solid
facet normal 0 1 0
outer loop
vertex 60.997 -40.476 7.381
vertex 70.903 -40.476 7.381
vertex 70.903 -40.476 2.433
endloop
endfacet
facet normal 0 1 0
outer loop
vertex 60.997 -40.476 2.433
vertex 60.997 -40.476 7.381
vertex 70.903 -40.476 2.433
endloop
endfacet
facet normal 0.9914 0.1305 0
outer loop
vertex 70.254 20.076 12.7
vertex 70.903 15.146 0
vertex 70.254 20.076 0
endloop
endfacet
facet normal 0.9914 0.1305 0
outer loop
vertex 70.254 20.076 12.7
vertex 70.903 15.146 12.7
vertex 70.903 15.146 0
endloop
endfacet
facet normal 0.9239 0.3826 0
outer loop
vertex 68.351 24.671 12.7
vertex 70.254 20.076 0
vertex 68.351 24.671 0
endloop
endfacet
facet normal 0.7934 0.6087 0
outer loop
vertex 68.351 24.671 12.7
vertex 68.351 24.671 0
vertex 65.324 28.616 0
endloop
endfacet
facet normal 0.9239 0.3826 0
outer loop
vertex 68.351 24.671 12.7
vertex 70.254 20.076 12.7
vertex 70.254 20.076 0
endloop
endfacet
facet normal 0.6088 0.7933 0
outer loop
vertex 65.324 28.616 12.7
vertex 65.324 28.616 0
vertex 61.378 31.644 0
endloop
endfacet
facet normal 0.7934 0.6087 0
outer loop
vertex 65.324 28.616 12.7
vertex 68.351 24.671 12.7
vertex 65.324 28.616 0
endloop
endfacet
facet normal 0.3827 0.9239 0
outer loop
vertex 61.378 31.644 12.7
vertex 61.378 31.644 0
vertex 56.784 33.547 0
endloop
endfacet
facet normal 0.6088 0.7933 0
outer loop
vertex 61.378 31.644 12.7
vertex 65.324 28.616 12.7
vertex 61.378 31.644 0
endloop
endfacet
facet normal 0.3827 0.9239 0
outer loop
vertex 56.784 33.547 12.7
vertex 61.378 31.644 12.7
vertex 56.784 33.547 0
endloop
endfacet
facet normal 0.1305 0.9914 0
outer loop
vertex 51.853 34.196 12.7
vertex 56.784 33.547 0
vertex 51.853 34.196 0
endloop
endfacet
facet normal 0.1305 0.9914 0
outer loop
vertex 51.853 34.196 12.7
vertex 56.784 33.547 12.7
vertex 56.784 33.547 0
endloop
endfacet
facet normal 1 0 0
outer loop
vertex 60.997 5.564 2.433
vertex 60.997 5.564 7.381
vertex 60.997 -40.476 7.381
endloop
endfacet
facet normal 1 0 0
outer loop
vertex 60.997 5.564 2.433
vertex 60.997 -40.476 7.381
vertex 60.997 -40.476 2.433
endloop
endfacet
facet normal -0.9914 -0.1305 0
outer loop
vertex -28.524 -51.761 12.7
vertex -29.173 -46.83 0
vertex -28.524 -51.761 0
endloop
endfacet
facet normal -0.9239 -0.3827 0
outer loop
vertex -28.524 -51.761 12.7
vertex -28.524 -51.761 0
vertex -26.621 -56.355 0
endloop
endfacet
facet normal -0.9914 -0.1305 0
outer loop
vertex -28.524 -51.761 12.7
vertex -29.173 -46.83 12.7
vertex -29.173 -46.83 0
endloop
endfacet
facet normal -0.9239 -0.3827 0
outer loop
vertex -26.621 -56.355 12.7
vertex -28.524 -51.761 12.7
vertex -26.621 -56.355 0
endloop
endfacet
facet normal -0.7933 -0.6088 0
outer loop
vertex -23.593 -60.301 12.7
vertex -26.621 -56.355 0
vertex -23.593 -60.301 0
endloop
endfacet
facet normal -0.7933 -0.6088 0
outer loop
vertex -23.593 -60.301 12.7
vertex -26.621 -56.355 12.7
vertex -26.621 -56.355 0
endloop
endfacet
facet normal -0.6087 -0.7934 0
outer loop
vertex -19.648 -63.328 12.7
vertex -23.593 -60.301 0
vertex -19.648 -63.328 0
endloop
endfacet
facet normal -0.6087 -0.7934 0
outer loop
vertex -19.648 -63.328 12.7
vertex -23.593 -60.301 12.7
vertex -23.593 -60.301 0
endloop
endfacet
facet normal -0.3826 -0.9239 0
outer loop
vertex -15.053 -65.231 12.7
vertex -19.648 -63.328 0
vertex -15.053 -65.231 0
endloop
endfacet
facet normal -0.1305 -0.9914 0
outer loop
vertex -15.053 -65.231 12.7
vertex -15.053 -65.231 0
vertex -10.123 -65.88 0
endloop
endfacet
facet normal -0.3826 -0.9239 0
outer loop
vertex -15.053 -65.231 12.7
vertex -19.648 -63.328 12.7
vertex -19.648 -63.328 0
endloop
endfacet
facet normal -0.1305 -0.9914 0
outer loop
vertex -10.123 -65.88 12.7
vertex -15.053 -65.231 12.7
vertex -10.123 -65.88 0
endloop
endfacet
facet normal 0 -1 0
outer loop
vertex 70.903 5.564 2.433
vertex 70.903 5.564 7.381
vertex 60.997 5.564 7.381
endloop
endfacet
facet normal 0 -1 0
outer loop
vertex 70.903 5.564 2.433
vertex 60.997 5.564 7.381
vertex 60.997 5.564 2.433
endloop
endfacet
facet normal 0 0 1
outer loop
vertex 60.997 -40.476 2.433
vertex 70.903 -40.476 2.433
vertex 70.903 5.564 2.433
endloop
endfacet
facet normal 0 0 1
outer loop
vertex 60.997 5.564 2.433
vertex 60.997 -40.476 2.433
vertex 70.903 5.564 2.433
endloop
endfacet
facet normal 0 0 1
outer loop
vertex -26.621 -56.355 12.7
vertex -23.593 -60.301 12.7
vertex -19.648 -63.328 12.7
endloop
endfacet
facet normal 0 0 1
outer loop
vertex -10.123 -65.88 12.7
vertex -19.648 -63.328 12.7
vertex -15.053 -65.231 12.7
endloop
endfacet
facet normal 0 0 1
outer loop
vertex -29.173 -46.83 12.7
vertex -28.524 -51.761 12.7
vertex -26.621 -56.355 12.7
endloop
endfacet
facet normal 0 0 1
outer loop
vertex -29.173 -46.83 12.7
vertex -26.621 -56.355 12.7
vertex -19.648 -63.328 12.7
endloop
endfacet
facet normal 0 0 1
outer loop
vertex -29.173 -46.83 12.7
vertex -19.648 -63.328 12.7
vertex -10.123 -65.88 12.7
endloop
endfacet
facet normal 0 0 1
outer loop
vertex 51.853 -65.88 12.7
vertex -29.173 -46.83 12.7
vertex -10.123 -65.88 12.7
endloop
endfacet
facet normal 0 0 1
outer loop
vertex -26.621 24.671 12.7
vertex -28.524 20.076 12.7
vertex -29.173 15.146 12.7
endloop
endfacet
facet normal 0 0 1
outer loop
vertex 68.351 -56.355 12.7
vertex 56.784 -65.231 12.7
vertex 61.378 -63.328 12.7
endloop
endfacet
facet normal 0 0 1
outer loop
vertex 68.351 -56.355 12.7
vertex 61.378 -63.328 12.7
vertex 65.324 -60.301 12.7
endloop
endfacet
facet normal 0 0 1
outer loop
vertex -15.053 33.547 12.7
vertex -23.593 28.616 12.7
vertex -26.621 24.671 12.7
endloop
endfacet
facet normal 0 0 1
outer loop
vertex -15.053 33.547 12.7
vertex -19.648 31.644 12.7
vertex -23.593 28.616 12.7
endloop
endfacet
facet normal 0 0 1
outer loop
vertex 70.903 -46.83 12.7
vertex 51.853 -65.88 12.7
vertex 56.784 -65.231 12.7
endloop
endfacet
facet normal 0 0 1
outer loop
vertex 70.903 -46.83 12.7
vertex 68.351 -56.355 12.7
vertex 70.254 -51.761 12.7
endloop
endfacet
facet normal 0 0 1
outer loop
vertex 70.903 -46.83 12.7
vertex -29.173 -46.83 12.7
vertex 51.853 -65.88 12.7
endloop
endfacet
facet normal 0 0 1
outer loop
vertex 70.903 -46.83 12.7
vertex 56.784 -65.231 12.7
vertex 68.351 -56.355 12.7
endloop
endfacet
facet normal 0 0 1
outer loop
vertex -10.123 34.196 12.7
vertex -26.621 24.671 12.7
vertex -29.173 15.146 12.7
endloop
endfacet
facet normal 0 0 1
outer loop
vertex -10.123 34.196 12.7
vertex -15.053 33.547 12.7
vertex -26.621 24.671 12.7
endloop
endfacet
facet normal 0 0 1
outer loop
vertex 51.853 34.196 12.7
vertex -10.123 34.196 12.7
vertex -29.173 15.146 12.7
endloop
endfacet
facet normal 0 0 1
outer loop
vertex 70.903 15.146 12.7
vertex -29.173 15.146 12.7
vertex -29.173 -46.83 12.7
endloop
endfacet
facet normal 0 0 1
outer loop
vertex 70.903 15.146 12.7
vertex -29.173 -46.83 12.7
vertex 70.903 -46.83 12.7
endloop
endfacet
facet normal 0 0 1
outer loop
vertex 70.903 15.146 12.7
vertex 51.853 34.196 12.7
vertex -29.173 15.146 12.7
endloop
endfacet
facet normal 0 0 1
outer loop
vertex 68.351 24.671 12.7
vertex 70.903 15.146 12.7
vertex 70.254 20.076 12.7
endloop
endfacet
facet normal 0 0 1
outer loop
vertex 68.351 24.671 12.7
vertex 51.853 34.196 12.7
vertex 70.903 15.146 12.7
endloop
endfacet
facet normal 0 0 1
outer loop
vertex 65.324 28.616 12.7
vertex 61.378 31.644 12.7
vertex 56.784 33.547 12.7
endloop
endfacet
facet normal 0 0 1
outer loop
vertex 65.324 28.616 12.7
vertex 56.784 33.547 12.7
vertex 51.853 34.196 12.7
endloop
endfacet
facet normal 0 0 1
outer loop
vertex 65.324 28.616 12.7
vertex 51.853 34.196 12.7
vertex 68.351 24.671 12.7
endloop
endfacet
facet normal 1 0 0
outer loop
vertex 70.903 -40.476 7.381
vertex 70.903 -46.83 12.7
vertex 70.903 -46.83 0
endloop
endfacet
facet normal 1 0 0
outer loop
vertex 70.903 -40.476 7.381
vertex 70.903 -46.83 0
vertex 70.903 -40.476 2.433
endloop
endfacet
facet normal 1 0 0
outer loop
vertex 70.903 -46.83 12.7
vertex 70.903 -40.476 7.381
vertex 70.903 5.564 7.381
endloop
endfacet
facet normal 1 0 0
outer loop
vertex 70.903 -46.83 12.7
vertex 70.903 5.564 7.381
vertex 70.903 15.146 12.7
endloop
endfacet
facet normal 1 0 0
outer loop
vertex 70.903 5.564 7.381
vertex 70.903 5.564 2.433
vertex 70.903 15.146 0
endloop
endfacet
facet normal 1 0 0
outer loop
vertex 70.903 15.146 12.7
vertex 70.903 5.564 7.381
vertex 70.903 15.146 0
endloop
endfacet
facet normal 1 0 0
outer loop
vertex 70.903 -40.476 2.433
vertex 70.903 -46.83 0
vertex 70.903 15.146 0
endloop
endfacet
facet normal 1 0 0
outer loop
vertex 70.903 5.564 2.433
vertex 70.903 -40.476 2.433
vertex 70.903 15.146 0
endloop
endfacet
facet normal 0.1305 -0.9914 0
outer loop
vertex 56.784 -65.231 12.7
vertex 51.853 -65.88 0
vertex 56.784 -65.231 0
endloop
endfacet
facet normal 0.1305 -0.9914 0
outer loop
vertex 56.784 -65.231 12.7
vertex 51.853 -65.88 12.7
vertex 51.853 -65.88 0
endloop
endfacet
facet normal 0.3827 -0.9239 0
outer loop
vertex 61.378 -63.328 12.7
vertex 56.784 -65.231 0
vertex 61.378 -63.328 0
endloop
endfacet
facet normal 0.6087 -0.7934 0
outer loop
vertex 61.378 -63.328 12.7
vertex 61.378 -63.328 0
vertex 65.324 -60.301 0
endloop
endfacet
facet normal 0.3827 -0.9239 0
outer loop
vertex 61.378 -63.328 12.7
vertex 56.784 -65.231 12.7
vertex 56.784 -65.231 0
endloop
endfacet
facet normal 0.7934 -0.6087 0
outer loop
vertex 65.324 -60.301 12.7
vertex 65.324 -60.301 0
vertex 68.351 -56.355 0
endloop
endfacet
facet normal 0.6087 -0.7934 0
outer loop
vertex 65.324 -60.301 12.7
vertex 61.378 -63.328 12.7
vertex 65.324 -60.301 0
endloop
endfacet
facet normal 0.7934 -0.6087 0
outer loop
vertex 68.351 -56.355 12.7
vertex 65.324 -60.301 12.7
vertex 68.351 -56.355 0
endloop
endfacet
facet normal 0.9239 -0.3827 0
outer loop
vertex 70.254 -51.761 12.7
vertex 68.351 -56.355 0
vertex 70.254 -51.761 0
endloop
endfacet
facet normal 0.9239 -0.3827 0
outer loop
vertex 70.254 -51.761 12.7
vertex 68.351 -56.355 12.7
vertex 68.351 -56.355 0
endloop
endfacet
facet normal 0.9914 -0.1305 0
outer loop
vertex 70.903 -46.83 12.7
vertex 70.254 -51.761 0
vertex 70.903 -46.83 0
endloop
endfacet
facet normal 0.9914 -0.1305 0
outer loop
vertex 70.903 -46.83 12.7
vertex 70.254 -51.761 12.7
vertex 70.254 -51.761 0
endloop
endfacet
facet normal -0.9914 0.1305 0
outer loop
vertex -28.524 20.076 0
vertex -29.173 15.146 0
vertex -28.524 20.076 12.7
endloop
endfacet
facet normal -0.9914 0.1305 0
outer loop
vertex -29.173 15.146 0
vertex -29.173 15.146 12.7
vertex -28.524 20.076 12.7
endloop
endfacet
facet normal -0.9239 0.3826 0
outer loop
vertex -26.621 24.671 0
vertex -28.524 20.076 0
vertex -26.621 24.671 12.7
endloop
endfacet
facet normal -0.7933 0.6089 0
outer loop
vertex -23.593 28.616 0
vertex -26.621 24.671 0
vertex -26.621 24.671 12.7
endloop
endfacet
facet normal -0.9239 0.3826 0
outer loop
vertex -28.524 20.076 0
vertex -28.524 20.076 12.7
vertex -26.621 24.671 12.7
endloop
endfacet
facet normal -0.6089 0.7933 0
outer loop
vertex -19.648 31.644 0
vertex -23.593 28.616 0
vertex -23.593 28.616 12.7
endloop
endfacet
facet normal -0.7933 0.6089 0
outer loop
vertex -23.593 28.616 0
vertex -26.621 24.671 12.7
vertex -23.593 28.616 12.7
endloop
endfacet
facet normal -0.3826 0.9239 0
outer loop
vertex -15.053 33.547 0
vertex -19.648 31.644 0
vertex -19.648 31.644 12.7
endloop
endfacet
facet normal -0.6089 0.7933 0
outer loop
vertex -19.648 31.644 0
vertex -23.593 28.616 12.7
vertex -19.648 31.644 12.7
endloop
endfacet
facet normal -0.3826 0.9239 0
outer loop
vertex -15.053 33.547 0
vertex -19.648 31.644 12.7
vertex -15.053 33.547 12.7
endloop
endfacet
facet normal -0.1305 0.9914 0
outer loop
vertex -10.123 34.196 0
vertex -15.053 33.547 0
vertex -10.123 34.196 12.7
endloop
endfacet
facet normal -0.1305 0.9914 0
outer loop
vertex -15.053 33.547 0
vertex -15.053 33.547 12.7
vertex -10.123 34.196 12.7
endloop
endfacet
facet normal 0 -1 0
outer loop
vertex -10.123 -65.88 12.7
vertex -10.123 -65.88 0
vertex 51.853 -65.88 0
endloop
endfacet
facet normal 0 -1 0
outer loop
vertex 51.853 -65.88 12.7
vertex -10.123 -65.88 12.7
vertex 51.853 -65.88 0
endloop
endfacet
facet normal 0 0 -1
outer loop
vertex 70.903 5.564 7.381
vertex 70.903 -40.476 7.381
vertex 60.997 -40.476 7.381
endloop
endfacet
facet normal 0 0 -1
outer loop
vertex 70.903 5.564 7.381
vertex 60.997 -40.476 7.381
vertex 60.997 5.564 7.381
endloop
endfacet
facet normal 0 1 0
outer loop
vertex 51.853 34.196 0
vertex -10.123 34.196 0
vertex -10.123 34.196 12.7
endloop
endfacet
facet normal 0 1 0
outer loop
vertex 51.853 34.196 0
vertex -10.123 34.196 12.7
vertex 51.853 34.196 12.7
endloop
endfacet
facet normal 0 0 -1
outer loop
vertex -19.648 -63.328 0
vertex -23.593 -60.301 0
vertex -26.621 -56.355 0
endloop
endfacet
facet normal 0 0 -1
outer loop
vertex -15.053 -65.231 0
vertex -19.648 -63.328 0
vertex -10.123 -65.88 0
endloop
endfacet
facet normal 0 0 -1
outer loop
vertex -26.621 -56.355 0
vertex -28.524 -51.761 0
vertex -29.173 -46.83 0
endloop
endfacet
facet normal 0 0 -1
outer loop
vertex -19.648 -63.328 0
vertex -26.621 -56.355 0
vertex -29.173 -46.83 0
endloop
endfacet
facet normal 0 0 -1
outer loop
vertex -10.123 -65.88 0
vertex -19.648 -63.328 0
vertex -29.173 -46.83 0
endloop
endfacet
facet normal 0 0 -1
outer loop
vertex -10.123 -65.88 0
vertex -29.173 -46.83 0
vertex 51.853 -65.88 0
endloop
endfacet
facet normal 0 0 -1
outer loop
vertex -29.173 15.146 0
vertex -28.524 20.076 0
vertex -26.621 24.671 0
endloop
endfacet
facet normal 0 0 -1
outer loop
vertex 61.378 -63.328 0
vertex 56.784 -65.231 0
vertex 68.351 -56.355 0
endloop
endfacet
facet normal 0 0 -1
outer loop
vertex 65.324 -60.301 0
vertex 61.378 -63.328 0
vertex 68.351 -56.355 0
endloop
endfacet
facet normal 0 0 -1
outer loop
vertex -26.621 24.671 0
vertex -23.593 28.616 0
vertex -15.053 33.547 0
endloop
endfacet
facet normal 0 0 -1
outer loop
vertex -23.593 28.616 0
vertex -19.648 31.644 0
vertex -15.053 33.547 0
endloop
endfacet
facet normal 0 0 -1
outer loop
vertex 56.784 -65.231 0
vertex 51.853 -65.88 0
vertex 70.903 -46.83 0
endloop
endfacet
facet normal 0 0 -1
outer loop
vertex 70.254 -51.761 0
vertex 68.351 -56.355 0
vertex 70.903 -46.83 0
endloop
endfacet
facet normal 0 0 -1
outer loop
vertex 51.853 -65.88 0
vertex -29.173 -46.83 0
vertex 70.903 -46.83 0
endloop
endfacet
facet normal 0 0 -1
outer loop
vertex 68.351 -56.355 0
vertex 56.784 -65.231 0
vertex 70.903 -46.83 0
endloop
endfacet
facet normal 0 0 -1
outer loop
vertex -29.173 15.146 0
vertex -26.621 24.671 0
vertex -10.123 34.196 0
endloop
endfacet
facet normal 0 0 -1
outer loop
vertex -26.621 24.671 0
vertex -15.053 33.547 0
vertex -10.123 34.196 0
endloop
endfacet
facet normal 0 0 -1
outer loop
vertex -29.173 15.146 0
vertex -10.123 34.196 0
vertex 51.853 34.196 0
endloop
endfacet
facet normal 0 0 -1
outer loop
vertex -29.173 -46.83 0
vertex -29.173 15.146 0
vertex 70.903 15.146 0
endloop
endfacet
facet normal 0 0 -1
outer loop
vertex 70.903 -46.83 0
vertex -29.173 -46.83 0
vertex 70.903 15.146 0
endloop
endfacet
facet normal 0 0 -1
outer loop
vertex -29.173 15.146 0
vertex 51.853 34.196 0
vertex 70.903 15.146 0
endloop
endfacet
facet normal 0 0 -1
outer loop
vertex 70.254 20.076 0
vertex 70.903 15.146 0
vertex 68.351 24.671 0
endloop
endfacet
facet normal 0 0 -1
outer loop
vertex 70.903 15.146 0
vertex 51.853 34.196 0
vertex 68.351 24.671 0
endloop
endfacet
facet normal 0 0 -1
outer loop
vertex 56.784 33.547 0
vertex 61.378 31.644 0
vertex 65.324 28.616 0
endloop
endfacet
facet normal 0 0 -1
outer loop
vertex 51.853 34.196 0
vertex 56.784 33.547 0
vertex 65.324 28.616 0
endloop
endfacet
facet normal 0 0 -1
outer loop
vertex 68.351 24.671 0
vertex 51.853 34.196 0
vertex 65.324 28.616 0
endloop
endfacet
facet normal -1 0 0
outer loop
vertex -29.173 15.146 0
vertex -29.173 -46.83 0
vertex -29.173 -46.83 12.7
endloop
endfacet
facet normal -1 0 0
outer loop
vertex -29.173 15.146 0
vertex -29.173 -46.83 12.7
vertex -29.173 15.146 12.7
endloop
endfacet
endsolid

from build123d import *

# Parameters (mm, degrees)
SKETCH2_W           = 100.076
SKETCH2_H           = 100.076
BOSS_EXTRUDE2_DEPTH = 12.7
FILLET1_R           = 19.05
SKETCH3_W           = 4.948209201
SKETCH3_H           = 46.039859528
CUT_EXTRUDE1_DEPTH  = 9.906


with BuildPart() as part:
    # Sketch2 → Boss-Extrude2 (new body)
    with BuildSketch(Plane.XY):
        with Locations((20.865266409, -15.842146718)):
            Rectangle(SKETCH2_W, SKETCH2_H)
    extrude(amount=BOSS_EXTRUDE2_DEPTH)

    # Fillet1
    fillet1_edges = [part.edges().sort_by_distance(p)[0] for p in [
        (-29.172733591, 34.195853282, 6.35),
        (70.903266409, 34.195853282, 6.35),
        (70.903266409, -65.880146718, 6.35),
        (-29.172733591, -65.880146718, 6.35),
    ]]
    fillet(fillet1_edges, radius=FILLET1_R)

    # Sketch3 → Cut-Extrude1 (cut)
    with BuildSketch(Plane(origin=(70.903266409, 0, 0), x_dir=(0, 0, -1), z_dir=(1, 0, 0))):
        with Locations((-4.90705885, -17.455693197)):
            Rectangle(SKETCH3_W, SKETCH3_H)
    extrude(amount=-CUT_EXTRUDE1_DEPTH, mode=Mode.SUBTRACT)


solid = part.part
